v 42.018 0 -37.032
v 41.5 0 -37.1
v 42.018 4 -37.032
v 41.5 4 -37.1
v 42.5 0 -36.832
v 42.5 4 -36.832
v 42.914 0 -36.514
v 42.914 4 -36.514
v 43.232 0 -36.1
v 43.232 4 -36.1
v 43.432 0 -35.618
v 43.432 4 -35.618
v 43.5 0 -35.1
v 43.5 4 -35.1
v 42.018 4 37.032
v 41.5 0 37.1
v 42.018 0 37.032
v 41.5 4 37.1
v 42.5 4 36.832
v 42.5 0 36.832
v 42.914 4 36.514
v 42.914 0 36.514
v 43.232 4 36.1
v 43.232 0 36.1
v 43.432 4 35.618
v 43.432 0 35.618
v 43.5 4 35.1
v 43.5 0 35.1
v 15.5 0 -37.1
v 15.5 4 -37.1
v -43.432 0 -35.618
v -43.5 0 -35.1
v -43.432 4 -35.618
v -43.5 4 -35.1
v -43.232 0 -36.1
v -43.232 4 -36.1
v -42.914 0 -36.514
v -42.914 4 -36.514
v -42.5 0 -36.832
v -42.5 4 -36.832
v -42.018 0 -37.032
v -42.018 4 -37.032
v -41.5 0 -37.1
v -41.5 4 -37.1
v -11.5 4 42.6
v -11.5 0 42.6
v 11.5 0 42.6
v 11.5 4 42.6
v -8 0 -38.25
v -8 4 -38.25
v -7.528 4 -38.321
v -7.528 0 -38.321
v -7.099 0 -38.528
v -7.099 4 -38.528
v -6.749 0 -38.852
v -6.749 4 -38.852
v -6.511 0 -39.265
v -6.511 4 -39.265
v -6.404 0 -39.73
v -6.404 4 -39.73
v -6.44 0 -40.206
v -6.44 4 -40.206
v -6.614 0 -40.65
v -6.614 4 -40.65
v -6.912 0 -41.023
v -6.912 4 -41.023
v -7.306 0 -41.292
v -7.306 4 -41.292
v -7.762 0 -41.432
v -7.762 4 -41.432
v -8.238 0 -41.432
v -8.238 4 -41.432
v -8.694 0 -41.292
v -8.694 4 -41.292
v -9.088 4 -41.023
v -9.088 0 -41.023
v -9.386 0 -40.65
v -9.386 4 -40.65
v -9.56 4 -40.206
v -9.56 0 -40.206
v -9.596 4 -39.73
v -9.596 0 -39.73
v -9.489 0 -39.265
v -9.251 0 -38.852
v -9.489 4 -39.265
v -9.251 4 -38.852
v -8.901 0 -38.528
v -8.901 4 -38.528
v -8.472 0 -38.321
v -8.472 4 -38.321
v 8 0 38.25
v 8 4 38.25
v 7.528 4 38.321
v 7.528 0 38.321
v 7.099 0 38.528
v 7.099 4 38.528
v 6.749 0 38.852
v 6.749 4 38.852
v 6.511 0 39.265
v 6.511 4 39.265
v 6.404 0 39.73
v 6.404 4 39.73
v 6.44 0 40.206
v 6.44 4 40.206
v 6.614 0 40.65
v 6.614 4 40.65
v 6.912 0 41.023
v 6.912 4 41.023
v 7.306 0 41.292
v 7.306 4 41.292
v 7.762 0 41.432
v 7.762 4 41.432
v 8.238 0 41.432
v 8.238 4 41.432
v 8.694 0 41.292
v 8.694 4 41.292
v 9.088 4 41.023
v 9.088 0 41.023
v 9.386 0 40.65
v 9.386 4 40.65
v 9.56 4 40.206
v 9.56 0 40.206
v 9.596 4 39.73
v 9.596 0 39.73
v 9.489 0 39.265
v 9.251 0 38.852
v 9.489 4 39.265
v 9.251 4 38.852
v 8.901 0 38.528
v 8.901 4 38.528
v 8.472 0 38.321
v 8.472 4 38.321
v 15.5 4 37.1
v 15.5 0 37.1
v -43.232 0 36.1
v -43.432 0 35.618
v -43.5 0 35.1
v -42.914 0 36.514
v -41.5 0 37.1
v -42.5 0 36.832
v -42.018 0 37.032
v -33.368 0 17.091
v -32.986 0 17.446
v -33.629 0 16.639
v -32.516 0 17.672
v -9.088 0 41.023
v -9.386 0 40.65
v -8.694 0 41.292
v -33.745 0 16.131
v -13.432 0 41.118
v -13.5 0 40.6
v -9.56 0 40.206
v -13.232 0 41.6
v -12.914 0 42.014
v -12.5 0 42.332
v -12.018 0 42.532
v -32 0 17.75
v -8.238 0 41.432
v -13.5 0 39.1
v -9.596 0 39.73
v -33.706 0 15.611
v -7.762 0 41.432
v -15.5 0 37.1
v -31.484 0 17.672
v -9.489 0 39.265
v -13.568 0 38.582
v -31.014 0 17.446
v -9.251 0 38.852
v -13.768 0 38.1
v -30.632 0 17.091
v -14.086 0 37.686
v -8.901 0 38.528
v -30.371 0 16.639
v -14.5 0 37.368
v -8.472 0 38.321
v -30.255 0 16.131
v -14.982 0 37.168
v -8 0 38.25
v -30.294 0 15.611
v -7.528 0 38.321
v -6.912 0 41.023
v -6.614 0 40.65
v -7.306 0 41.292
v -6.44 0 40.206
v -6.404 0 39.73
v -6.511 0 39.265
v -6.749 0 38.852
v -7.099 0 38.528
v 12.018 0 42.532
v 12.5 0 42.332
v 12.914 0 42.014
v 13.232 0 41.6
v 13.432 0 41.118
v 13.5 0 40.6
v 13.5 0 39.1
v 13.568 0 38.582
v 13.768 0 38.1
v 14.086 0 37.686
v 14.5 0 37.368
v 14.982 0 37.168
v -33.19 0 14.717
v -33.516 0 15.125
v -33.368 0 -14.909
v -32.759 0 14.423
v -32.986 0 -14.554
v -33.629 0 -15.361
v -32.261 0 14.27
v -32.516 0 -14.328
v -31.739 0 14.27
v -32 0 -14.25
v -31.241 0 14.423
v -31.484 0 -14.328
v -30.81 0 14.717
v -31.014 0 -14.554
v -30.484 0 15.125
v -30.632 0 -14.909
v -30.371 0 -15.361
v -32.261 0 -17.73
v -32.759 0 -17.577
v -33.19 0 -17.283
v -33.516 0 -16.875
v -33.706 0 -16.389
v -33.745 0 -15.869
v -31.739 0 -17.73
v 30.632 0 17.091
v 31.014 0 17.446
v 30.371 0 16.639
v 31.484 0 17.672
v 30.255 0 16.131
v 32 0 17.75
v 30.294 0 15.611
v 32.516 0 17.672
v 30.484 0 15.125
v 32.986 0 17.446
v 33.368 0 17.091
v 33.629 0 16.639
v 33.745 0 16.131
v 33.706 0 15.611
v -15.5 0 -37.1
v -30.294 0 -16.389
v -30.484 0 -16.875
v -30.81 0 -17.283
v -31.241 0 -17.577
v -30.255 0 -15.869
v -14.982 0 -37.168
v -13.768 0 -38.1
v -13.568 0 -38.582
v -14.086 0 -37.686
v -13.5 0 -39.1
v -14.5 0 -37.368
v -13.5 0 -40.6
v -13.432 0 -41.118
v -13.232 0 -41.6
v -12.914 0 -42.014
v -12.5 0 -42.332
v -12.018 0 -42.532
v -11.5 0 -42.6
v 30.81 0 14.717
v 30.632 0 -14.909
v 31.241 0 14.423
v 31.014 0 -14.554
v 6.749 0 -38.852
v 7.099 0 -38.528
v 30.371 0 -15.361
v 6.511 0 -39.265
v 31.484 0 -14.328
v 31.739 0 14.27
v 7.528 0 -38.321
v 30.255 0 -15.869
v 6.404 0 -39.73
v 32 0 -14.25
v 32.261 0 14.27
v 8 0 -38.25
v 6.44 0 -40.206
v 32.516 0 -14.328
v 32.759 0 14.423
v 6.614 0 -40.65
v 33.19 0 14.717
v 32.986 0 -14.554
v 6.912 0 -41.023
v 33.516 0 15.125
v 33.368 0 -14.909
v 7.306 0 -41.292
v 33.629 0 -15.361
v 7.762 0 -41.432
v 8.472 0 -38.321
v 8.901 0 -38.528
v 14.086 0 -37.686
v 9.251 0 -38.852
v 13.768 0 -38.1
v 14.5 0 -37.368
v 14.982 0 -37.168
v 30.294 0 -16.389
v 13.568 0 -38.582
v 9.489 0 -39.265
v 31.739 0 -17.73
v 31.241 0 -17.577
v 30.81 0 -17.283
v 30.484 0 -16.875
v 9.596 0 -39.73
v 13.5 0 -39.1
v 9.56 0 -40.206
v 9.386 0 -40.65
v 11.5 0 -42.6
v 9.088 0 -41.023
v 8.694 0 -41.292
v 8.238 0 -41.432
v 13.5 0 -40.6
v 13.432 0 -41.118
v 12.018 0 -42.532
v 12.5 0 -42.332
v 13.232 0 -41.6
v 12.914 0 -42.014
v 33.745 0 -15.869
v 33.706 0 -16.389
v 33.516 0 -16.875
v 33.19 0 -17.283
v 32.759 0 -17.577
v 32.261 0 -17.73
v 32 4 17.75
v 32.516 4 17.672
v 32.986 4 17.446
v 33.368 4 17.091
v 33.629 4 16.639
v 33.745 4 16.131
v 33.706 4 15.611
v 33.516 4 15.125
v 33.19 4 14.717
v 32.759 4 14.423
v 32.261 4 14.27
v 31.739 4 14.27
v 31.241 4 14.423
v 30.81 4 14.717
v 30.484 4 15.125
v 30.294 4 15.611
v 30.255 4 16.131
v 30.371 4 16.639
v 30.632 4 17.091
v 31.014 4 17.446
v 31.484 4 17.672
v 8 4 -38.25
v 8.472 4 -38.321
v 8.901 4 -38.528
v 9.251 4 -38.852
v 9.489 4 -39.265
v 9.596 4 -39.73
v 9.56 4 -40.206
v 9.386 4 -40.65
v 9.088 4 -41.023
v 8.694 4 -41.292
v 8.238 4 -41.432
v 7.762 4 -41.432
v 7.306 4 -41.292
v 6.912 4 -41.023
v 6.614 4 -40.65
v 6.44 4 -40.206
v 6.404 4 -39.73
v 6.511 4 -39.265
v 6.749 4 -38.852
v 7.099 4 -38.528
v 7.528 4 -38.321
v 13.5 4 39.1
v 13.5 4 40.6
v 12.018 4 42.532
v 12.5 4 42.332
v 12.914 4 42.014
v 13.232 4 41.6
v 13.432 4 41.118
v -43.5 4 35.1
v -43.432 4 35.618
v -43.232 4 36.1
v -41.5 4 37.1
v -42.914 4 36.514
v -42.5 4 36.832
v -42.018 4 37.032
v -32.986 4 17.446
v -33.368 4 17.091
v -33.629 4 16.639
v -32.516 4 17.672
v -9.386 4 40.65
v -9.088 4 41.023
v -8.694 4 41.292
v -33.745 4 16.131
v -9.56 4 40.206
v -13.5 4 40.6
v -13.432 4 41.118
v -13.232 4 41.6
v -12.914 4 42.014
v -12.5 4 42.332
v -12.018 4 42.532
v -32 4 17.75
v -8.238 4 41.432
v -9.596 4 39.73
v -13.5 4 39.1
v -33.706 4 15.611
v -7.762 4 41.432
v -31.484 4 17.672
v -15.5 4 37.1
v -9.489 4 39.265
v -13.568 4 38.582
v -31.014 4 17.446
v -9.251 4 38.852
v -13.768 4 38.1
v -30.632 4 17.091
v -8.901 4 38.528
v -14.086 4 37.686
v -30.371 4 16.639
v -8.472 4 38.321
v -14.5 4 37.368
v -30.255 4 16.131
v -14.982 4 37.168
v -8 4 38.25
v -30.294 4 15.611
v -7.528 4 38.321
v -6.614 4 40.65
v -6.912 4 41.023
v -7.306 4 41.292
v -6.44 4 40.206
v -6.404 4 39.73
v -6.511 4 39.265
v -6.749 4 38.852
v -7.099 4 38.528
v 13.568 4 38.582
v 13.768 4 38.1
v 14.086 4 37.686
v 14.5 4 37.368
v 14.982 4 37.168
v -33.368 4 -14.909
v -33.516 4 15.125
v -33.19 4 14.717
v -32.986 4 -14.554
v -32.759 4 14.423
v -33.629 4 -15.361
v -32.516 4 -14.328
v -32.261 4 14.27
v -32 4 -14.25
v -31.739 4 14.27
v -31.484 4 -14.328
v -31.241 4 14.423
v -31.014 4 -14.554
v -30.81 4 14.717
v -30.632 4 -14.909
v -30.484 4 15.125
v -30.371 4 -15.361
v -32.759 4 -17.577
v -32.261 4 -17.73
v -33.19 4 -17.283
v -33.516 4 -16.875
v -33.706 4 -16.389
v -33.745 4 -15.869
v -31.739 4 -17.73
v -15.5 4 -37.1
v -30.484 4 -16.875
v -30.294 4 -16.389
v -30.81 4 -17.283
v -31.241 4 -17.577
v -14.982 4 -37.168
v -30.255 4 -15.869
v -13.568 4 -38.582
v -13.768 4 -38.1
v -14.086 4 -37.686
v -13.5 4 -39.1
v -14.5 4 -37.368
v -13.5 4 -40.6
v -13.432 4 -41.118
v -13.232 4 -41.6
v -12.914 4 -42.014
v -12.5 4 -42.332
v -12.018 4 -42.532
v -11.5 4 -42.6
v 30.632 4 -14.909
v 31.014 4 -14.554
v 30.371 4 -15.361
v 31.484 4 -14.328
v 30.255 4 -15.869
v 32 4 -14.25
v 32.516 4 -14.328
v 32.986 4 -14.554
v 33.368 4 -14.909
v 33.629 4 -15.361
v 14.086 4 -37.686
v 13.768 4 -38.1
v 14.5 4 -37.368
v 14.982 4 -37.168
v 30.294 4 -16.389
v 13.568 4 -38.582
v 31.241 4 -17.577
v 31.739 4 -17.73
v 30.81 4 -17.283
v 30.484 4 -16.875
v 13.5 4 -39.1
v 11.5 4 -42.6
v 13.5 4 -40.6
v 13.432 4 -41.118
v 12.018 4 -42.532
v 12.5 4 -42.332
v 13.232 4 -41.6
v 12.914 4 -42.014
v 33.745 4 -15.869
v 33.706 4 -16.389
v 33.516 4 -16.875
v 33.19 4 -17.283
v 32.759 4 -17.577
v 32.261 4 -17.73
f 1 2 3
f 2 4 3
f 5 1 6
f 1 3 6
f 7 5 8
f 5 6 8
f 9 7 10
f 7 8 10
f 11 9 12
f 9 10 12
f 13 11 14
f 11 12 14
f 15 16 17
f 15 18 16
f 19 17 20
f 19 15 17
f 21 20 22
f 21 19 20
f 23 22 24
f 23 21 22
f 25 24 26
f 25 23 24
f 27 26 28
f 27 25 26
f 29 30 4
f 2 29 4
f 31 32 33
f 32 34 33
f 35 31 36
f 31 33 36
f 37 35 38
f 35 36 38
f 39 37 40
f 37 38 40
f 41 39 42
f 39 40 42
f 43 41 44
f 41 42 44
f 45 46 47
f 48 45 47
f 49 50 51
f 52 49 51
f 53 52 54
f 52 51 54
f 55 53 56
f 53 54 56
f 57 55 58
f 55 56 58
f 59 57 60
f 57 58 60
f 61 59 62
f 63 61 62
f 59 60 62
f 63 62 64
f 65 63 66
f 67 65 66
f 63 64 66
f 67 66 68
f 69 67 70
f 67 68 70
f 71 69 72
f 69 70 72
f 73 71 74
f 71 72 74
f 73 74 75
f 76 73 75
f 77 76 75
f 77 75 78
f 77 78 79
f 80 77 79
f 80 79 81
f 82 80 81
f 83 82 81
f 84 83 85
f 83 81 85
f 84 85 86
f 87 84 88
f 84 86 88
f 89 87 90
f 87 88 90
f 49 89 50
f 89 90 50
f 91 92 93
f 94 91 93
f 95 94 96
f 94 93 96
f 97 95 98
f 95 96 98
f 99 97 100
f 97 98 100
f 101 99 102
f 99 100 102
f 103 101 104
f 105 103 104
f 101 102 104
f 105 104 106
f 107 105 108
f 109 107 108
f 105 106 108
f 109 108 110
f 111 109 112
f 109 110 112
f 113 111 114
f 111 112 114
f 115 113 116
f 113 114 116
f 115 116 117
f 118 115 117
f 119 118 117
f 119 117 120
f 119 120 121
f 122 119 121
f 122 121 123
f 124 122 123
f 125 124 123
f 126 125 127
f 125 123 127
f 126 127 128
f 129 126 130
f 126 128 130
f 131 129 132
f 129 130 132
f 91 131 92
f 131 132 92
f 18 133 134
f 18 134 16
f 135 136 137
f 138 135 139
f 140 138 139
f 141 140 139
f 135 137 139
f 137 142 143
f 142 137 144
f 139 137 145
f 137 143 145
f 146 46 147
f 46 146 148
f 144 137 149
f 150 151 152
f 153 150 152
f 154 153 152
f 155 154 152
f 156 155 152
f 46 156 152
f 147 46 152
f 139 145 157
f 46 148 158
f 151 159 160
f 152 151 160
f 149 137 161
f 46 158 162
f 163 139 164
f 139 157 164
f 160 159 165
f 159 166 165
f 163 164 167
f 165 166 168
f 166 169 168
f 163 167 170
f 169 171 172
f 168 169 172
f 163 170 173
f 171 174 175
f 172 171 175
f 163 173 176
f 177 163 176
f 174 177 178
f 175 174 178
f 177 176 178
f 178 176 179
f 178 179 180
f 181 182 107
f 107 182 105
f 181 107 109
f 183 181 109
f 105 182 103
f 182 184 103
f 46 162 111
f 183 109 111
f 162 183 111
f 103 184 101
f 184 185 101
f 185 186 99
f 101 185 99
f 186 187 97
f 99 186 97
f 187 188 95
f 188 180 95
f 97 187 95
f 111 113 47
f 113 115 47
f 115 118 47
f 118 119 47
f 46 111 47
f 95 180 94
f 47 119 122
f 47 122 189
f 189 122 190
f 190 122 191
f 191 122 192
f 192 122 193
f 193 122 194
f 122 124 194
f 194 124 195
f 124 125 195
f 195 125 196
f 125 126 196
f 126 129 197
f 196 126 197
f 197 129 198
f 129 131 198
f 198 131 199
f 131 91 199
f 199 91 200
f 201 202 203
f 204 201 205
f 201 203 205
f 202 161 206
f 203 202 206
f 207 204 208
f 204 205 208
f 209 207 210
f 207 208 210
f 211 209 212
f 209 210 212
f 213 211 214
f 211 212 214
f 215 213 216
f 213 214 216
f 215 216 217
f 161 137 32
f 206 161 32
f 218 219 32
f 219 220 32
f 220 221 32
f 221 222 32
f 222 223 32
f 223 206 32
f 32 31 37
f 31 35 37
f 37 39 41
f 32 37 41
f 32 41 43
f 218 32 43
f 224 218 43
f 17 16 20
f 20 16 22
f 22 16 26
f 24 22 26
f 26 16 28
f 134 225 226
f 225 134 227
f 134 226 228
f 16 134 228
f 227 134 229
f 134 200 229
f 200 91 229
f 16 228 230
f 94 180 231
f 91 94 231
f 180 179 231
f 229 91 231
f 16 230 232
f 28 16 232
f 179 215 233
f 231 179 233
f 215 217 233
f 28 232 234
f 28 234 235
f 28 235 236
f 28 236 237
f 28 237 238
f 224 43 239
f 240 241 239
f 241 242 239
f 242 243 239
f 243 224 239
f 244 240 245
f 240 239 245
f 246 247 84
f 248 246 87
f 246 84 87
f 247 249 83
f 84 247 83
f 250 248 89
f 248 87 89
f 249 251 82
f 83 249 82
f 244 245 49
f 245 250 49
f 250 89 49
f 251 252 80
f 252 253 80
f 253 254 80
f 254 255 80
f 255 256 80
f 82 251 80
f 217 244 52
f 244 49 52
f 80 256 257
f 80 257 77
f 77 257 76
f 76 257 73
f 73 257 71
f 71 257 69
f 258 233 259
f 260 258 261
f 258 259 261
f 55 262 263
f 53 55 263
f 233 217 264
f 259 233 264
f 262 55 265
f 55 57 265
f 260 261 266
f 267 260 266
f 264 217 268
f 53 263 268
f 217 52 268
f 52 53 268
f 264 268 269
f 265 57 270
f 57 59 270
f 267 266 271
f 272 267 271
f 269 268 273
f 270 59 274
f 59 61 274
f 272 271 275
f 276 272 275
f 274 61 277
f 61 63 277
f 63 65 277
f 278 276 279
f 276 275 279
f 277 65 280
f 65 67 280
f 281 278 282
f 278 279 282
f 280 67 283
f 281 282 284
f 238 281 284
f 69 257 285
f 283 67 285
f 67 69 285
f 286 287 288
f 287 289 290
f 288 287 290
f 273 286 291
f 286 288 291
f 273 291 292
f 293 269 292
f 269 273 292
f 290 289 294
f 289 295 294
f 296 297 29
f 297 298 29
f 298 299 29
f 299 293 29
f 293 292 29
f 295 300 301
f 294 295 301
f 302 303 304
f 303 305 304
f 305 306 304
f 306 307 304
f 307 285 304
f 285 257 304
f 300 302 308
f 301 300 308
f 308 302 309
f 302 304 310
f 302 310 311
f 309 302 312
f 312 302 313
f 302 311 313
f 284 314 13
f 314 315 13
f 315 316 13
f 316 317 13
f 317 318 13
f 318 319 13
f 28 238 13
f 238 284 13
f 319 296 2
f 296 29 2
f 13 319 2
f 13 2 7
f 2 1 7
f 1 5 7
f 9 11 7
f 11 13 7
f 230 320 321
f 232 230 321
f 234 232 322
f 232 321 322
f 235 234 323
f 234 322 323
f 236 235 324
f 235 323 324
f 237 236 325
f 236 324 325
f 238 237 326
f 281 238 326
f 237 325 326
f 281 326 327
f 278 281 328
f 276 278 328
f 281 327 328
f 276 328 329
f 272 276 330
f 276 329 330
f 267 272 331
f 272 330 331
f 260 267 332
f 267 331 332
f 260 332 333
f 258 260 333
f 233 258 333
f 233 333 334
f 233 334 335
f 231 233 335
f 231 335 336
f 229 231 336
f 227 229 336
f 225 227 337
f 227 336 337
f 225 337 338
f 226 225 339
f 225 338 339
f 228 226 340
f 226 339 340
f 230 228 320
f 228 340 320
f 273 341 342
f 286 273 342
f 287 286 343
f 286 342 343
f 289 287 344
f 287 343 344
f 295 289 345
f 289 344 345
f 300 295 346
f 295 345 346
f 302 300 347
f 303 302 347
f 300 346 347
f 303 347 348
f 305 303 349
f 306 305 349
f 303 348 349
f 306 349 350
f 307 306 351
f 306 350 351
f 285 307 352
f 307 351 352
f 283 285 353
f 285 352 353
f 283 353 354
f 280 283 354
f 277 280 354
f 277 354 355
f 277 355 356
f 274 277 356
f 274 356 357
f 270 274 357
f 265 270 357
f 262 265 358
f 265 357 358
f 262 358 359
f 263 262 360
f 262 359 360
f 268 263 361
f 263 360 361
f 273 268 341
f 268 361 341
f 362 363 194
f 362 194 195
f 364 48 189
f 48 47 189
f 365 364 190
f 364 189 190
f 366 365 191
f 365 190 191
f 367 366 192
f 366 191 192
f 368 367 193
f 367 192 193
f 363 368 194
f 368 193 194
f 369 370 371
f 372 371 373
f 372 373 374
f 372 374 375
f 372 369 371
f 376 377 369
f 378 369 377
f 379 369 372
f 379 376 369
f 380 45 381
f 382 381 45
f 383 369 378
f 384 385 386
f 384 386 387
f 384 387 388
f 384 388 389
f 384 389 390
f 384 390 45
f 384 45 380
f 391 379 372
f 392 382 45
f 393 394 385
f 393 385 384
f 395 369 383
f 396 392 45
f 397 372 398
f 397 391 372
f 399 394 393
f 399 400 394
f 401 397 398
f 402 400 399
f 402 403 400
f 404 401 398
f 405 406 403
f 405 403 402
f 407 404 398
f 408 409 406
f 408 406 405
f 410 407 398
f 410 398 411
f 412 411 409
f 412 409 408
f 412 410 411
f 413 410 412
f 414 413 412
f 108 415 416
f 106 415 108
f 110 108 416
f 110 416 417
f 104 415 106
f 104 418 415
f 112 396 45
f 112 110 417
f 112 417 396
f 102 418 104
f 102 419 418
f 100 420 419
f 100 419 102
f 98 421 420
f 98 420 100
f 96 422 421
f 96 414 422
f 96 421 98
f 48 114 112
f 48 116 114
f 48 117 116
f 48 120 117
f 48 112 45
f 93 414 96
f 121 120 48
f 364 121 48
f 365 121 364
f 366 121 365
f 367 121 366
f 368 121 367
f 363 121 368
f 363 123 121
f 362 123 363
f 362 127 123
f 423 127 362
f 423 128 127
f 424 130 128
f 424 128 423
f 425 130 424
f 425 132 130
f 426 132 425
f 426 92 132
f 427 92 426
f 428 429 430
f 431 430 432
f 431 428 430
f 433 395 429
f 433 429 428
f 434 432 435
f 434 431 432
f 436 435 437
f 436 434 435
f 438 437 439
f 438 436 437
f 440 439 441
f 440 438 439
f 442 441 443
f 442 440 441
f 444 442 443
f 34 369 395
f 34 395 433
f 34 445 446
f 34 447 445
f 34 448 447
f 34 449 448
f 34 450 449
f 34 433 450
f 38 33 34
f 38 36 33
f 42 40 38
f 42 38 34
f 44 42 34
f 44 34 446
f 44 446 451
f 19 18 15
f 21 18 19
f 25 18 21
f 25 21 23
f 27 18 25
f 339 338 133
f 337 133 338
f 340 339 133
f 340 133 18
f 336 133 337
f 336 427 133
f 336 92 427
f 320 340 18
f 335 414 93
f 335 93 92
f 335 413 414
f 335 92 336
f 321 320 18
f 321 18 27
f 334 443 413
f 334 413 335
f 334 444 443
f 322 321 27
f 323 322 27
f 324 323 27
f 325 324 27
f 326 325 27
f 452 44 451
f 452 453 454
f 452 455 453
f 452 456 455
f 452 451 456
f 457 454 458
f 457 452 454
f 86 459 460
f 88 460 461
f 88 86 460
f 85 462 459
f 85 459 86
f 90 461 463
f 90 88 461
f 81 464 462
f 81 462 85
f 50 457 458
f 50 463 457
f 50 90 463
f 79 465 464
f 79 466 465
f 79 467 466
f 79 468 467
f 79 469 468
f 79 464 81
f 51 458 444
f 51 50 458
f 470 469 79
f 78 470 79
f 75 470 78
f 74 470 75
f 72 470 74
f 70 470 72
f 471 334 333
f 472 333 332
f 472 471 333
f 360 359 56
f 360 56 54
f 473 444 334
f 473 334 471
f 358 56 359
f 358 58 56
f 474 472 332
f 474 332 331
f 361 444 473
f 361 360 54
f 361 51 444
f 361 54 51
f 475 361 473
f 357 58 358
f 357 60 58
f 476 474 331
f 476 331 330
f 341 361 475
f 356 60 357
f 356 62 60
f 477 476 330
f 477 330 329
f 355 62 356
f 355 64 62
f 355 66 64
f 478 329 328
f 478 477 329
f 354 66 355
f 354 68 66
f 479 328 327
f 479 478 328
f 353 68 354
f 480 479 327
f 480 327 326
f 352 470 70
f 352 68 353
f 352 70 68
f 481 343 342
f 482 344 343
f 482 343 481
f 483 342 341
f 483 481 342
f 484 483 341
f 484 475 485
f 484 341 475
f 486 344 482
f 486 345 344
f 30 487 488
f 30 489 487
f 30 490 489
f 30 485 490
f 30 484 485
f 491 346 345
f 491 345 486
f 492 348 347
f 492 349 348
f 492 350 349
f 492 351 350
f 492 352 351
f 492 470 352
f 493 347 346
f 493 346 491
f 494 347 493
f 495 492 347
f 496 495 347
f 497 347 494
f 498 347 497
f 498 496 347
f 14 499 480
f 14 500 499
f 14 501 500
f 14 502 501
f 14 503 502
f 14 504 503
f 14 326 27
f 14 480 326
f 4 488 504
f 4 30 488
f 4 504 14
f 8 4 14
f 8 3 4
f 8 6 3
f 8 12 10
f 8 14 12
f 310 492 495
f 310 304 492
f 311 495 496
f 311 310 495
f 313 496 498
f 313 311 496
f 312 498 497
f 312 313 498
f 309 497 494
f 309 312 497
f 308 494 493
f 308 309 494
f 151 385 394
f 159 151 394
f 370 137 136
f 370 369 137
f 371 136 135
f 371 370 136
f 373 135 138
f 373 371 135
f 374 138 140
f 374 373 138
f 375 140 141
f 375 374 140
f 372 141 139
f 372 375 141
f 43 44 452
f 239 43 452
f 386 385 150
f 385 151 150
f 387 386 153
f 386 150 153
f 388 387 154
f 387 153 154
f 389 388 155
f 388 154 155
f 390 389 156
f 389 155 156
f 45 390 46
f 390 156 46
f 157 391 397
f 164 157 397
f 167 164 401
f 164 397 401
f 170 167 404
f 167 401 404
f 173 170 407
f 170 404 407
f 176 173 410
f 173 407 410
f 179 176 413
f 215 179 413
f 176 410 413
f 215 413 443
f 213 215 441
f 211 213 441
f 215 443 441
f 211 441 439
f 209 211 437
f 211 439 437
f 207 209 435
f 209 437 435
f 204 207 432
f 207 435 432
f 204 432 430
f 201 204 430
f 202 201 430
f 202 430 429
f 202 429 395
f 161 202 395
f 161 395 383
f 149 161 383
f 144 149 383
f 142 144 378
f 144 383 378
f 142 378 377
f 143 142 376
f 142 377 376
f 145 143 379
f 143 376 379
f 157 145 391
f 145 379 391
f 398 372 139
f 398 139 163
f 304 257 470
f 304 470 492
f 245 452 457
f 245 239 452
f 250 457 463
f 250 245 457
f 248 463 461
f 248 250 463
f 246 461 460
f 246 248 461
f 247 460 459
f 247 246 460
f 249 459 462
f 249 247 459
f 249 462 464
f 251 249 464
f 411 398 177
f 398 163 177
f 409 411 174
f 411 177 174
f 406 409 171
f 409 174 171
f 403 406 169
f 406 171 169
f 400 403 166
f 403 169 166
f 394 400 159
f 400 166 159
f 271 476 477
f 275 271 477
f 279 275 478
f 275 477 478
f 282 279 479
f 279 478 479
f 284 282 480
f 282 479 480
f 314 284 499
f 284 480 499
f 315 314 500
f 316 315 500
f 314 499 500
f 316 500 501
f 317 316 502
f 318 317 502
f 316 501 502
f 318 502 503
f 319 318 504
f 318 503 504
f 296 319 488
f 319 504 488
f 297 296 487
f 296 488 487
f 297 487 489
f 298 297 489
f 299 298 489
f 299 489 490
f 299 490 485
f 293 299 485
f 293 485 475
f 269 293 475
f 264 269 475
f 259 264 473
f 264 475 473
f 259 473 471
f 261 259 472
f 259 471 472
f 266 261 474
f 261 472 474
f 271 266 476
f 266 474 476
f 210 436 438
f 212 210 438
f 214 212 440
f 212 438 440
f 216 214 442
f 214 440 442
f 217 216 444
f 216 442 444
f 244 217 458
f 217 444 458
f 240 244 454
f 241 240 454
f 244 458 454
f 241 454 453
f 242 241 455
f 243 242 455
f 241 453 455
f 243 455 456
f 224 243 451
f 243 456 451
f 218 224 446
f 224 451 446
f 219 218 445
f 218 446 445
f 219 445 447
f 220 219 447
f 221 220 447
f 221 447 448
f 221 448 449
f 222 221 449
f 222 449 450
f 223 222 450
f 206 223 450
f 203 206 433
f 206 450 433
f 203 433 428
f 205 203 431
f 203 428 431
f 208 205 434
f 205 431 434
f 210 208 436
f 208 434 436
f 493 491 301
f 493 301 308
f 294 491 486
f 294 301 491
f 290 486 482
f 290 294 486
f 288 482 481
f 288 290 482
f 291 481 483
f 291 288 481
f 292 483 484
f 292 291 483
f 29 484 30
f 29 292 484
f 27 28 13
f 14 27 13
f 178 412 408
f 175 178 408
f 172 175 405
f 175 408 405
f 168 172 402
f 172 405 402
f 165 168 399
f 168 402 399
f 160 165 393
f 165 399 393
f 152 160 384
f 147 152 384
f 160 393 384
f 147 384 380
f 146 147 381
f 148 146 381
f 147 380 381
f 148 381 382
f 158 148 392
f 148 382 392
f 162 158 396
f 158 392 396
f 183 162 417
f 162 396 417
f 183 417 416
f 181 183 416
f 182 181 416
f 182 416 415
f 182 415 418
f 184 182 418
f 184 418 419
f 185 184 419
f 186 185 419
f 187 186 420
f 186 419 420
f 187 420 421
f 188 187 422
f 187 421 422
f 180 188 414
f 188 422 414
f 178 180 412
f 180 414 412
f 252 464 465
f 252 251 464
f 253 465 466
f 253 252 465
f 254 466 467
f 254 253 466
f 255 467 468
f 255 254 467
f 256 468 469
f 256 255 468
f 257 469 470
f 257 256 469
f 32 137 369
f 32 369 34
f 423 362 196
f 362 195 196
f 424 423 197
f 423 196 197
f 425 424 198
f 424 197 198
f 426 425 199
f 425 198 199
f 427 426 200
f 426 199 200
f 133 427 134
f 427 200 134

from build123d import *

# Parameters (mm, degrees)
SKETCH_1_W          = 87
SKETCH_1_H          = 85.2
EXTRUDE_1_DEPTH     = 4
SKETCH_2_W          = 60
SKETCH_2_H          = 11
CUT_EXTRUDE_1_DEPTH = 4
SKETCH_3_R          = 1.75
CUT_EXTRUDE_2_DEPTH = 4
SKETCH_4_R          = 1.6
CUT_EXTRUDE_3_DEPTH = 4
FILLET_3_R          = 2


with BuildPart() as part:
    # 草图1 → 凸台-拉伸1 (new body)
    with BuildSketch(Plane(origin=(0, 0, 0), x_dir=(1, 0, 0), z_dir=(0, 1, 0))):
        Rectangle(SKETCH_1_W, SKETCH_1_H)
    extrude(amount=EXTRUDE_1_DEPTH)

    # 草图2 → 切除-拉伸1 (cut)
    with BuildSketch(Plane(origin=(0, 4, 0), x_dir=(1, 0, 0), z_dir=(0, 1, 0))):
        with Locations((-43.5, 42.6)):
            Rectangle(SKETCH_2_W, SKETCH_2_H)
        with Locations((43.5, 42.6)):
            Rectangle(SKETCH_2_W, SKETCH_2_H)
        with Locations((43.5, -42.6)):
            Rectangle(SKETCH_2_W, SKETCH_2_H)
        with Locations((-43.5, -42.6)):
            Rectangle(SKETCH_2_W, SKETCH_2_H)
    extrude(amount=-CUT_EXTRUDE_1_DEPTH, mode=Mode.SUBTRACT)

    # 草图3 → 切除-拉伸2 (cut)
    with BuildSketch(Plane(origin=(0, 4, 0), x_dir=(1, 0, 0), z_dir=(0, 1, 0))):
        with Locations(Location((-32, 16, 0), (0, 0, 270))):
            Circle(SKETCH_3_R)
        with Locations(Location((32, 16, 0), (0, 0, 270))):
            Circle(SKETCH_3_R)
        with Locations(Location((-32, -16, 0), (0, 0, 270))):
            Circle(SKETCH_3_R)
        with Locations(Location((32, -16, 0), (0, 0, 270))):
            Circle(SKETCH_3_R)
    extrude(amount=-CUT_EXTRUDE_2_DEPTH, mode=Mode.SUBTRACT)

    # 草图4 → 切除-拉伸3 (cut)
    with BuildSketch(Plane(origin=(0, 4, 0), x_dir=(1, 0, 0), z_dir=(0, 1, 0))):
        with Locations(Location((-8, 39.85, 0), (0, 0, 270))):
            Circle(SKETCH_4_R)
        with Locations(Location((8, 39.85, 0), (0, 0, 270))):
            Circle(SKETCH_4_R)
        with Locations(Location((8, -39.85, 0), (0, 0, 90))):
            Circle(SKETCH_4_R)
        with Locations(Location((-8, -39.85, 0), (0, 0, 90))):
            Circle(SKETCH_4_R)
    extrude(amount=-CUT_EXTRUDE_3_DEPTH, mode=Mode.SUBTRACT)

    # 圆角3
    fillet_3_edges = [part.edges().sort_by_distance(p)[0] for p in [
        (-13.5, 2, -42.6),
        (-43.5, 2, -37.1),
        (-13.5, 2, -37.1),
        (43.5, 2, -37.1),
        (13.5, 2, -42.6),
        (13.5, 2, -37.1),
        (43.5, 2, 37.1),
        (13.5, 2, 37.1),
        (13.5, 2, 42.6),
        (-43.5, 2, 37.1),
        (-13.5, 2, 42.6),
        (-13.5, 2, 37.1),
    ]]
    fillet(fillet_3_edges, radius=FILLET_3_R)


solid = part.part
